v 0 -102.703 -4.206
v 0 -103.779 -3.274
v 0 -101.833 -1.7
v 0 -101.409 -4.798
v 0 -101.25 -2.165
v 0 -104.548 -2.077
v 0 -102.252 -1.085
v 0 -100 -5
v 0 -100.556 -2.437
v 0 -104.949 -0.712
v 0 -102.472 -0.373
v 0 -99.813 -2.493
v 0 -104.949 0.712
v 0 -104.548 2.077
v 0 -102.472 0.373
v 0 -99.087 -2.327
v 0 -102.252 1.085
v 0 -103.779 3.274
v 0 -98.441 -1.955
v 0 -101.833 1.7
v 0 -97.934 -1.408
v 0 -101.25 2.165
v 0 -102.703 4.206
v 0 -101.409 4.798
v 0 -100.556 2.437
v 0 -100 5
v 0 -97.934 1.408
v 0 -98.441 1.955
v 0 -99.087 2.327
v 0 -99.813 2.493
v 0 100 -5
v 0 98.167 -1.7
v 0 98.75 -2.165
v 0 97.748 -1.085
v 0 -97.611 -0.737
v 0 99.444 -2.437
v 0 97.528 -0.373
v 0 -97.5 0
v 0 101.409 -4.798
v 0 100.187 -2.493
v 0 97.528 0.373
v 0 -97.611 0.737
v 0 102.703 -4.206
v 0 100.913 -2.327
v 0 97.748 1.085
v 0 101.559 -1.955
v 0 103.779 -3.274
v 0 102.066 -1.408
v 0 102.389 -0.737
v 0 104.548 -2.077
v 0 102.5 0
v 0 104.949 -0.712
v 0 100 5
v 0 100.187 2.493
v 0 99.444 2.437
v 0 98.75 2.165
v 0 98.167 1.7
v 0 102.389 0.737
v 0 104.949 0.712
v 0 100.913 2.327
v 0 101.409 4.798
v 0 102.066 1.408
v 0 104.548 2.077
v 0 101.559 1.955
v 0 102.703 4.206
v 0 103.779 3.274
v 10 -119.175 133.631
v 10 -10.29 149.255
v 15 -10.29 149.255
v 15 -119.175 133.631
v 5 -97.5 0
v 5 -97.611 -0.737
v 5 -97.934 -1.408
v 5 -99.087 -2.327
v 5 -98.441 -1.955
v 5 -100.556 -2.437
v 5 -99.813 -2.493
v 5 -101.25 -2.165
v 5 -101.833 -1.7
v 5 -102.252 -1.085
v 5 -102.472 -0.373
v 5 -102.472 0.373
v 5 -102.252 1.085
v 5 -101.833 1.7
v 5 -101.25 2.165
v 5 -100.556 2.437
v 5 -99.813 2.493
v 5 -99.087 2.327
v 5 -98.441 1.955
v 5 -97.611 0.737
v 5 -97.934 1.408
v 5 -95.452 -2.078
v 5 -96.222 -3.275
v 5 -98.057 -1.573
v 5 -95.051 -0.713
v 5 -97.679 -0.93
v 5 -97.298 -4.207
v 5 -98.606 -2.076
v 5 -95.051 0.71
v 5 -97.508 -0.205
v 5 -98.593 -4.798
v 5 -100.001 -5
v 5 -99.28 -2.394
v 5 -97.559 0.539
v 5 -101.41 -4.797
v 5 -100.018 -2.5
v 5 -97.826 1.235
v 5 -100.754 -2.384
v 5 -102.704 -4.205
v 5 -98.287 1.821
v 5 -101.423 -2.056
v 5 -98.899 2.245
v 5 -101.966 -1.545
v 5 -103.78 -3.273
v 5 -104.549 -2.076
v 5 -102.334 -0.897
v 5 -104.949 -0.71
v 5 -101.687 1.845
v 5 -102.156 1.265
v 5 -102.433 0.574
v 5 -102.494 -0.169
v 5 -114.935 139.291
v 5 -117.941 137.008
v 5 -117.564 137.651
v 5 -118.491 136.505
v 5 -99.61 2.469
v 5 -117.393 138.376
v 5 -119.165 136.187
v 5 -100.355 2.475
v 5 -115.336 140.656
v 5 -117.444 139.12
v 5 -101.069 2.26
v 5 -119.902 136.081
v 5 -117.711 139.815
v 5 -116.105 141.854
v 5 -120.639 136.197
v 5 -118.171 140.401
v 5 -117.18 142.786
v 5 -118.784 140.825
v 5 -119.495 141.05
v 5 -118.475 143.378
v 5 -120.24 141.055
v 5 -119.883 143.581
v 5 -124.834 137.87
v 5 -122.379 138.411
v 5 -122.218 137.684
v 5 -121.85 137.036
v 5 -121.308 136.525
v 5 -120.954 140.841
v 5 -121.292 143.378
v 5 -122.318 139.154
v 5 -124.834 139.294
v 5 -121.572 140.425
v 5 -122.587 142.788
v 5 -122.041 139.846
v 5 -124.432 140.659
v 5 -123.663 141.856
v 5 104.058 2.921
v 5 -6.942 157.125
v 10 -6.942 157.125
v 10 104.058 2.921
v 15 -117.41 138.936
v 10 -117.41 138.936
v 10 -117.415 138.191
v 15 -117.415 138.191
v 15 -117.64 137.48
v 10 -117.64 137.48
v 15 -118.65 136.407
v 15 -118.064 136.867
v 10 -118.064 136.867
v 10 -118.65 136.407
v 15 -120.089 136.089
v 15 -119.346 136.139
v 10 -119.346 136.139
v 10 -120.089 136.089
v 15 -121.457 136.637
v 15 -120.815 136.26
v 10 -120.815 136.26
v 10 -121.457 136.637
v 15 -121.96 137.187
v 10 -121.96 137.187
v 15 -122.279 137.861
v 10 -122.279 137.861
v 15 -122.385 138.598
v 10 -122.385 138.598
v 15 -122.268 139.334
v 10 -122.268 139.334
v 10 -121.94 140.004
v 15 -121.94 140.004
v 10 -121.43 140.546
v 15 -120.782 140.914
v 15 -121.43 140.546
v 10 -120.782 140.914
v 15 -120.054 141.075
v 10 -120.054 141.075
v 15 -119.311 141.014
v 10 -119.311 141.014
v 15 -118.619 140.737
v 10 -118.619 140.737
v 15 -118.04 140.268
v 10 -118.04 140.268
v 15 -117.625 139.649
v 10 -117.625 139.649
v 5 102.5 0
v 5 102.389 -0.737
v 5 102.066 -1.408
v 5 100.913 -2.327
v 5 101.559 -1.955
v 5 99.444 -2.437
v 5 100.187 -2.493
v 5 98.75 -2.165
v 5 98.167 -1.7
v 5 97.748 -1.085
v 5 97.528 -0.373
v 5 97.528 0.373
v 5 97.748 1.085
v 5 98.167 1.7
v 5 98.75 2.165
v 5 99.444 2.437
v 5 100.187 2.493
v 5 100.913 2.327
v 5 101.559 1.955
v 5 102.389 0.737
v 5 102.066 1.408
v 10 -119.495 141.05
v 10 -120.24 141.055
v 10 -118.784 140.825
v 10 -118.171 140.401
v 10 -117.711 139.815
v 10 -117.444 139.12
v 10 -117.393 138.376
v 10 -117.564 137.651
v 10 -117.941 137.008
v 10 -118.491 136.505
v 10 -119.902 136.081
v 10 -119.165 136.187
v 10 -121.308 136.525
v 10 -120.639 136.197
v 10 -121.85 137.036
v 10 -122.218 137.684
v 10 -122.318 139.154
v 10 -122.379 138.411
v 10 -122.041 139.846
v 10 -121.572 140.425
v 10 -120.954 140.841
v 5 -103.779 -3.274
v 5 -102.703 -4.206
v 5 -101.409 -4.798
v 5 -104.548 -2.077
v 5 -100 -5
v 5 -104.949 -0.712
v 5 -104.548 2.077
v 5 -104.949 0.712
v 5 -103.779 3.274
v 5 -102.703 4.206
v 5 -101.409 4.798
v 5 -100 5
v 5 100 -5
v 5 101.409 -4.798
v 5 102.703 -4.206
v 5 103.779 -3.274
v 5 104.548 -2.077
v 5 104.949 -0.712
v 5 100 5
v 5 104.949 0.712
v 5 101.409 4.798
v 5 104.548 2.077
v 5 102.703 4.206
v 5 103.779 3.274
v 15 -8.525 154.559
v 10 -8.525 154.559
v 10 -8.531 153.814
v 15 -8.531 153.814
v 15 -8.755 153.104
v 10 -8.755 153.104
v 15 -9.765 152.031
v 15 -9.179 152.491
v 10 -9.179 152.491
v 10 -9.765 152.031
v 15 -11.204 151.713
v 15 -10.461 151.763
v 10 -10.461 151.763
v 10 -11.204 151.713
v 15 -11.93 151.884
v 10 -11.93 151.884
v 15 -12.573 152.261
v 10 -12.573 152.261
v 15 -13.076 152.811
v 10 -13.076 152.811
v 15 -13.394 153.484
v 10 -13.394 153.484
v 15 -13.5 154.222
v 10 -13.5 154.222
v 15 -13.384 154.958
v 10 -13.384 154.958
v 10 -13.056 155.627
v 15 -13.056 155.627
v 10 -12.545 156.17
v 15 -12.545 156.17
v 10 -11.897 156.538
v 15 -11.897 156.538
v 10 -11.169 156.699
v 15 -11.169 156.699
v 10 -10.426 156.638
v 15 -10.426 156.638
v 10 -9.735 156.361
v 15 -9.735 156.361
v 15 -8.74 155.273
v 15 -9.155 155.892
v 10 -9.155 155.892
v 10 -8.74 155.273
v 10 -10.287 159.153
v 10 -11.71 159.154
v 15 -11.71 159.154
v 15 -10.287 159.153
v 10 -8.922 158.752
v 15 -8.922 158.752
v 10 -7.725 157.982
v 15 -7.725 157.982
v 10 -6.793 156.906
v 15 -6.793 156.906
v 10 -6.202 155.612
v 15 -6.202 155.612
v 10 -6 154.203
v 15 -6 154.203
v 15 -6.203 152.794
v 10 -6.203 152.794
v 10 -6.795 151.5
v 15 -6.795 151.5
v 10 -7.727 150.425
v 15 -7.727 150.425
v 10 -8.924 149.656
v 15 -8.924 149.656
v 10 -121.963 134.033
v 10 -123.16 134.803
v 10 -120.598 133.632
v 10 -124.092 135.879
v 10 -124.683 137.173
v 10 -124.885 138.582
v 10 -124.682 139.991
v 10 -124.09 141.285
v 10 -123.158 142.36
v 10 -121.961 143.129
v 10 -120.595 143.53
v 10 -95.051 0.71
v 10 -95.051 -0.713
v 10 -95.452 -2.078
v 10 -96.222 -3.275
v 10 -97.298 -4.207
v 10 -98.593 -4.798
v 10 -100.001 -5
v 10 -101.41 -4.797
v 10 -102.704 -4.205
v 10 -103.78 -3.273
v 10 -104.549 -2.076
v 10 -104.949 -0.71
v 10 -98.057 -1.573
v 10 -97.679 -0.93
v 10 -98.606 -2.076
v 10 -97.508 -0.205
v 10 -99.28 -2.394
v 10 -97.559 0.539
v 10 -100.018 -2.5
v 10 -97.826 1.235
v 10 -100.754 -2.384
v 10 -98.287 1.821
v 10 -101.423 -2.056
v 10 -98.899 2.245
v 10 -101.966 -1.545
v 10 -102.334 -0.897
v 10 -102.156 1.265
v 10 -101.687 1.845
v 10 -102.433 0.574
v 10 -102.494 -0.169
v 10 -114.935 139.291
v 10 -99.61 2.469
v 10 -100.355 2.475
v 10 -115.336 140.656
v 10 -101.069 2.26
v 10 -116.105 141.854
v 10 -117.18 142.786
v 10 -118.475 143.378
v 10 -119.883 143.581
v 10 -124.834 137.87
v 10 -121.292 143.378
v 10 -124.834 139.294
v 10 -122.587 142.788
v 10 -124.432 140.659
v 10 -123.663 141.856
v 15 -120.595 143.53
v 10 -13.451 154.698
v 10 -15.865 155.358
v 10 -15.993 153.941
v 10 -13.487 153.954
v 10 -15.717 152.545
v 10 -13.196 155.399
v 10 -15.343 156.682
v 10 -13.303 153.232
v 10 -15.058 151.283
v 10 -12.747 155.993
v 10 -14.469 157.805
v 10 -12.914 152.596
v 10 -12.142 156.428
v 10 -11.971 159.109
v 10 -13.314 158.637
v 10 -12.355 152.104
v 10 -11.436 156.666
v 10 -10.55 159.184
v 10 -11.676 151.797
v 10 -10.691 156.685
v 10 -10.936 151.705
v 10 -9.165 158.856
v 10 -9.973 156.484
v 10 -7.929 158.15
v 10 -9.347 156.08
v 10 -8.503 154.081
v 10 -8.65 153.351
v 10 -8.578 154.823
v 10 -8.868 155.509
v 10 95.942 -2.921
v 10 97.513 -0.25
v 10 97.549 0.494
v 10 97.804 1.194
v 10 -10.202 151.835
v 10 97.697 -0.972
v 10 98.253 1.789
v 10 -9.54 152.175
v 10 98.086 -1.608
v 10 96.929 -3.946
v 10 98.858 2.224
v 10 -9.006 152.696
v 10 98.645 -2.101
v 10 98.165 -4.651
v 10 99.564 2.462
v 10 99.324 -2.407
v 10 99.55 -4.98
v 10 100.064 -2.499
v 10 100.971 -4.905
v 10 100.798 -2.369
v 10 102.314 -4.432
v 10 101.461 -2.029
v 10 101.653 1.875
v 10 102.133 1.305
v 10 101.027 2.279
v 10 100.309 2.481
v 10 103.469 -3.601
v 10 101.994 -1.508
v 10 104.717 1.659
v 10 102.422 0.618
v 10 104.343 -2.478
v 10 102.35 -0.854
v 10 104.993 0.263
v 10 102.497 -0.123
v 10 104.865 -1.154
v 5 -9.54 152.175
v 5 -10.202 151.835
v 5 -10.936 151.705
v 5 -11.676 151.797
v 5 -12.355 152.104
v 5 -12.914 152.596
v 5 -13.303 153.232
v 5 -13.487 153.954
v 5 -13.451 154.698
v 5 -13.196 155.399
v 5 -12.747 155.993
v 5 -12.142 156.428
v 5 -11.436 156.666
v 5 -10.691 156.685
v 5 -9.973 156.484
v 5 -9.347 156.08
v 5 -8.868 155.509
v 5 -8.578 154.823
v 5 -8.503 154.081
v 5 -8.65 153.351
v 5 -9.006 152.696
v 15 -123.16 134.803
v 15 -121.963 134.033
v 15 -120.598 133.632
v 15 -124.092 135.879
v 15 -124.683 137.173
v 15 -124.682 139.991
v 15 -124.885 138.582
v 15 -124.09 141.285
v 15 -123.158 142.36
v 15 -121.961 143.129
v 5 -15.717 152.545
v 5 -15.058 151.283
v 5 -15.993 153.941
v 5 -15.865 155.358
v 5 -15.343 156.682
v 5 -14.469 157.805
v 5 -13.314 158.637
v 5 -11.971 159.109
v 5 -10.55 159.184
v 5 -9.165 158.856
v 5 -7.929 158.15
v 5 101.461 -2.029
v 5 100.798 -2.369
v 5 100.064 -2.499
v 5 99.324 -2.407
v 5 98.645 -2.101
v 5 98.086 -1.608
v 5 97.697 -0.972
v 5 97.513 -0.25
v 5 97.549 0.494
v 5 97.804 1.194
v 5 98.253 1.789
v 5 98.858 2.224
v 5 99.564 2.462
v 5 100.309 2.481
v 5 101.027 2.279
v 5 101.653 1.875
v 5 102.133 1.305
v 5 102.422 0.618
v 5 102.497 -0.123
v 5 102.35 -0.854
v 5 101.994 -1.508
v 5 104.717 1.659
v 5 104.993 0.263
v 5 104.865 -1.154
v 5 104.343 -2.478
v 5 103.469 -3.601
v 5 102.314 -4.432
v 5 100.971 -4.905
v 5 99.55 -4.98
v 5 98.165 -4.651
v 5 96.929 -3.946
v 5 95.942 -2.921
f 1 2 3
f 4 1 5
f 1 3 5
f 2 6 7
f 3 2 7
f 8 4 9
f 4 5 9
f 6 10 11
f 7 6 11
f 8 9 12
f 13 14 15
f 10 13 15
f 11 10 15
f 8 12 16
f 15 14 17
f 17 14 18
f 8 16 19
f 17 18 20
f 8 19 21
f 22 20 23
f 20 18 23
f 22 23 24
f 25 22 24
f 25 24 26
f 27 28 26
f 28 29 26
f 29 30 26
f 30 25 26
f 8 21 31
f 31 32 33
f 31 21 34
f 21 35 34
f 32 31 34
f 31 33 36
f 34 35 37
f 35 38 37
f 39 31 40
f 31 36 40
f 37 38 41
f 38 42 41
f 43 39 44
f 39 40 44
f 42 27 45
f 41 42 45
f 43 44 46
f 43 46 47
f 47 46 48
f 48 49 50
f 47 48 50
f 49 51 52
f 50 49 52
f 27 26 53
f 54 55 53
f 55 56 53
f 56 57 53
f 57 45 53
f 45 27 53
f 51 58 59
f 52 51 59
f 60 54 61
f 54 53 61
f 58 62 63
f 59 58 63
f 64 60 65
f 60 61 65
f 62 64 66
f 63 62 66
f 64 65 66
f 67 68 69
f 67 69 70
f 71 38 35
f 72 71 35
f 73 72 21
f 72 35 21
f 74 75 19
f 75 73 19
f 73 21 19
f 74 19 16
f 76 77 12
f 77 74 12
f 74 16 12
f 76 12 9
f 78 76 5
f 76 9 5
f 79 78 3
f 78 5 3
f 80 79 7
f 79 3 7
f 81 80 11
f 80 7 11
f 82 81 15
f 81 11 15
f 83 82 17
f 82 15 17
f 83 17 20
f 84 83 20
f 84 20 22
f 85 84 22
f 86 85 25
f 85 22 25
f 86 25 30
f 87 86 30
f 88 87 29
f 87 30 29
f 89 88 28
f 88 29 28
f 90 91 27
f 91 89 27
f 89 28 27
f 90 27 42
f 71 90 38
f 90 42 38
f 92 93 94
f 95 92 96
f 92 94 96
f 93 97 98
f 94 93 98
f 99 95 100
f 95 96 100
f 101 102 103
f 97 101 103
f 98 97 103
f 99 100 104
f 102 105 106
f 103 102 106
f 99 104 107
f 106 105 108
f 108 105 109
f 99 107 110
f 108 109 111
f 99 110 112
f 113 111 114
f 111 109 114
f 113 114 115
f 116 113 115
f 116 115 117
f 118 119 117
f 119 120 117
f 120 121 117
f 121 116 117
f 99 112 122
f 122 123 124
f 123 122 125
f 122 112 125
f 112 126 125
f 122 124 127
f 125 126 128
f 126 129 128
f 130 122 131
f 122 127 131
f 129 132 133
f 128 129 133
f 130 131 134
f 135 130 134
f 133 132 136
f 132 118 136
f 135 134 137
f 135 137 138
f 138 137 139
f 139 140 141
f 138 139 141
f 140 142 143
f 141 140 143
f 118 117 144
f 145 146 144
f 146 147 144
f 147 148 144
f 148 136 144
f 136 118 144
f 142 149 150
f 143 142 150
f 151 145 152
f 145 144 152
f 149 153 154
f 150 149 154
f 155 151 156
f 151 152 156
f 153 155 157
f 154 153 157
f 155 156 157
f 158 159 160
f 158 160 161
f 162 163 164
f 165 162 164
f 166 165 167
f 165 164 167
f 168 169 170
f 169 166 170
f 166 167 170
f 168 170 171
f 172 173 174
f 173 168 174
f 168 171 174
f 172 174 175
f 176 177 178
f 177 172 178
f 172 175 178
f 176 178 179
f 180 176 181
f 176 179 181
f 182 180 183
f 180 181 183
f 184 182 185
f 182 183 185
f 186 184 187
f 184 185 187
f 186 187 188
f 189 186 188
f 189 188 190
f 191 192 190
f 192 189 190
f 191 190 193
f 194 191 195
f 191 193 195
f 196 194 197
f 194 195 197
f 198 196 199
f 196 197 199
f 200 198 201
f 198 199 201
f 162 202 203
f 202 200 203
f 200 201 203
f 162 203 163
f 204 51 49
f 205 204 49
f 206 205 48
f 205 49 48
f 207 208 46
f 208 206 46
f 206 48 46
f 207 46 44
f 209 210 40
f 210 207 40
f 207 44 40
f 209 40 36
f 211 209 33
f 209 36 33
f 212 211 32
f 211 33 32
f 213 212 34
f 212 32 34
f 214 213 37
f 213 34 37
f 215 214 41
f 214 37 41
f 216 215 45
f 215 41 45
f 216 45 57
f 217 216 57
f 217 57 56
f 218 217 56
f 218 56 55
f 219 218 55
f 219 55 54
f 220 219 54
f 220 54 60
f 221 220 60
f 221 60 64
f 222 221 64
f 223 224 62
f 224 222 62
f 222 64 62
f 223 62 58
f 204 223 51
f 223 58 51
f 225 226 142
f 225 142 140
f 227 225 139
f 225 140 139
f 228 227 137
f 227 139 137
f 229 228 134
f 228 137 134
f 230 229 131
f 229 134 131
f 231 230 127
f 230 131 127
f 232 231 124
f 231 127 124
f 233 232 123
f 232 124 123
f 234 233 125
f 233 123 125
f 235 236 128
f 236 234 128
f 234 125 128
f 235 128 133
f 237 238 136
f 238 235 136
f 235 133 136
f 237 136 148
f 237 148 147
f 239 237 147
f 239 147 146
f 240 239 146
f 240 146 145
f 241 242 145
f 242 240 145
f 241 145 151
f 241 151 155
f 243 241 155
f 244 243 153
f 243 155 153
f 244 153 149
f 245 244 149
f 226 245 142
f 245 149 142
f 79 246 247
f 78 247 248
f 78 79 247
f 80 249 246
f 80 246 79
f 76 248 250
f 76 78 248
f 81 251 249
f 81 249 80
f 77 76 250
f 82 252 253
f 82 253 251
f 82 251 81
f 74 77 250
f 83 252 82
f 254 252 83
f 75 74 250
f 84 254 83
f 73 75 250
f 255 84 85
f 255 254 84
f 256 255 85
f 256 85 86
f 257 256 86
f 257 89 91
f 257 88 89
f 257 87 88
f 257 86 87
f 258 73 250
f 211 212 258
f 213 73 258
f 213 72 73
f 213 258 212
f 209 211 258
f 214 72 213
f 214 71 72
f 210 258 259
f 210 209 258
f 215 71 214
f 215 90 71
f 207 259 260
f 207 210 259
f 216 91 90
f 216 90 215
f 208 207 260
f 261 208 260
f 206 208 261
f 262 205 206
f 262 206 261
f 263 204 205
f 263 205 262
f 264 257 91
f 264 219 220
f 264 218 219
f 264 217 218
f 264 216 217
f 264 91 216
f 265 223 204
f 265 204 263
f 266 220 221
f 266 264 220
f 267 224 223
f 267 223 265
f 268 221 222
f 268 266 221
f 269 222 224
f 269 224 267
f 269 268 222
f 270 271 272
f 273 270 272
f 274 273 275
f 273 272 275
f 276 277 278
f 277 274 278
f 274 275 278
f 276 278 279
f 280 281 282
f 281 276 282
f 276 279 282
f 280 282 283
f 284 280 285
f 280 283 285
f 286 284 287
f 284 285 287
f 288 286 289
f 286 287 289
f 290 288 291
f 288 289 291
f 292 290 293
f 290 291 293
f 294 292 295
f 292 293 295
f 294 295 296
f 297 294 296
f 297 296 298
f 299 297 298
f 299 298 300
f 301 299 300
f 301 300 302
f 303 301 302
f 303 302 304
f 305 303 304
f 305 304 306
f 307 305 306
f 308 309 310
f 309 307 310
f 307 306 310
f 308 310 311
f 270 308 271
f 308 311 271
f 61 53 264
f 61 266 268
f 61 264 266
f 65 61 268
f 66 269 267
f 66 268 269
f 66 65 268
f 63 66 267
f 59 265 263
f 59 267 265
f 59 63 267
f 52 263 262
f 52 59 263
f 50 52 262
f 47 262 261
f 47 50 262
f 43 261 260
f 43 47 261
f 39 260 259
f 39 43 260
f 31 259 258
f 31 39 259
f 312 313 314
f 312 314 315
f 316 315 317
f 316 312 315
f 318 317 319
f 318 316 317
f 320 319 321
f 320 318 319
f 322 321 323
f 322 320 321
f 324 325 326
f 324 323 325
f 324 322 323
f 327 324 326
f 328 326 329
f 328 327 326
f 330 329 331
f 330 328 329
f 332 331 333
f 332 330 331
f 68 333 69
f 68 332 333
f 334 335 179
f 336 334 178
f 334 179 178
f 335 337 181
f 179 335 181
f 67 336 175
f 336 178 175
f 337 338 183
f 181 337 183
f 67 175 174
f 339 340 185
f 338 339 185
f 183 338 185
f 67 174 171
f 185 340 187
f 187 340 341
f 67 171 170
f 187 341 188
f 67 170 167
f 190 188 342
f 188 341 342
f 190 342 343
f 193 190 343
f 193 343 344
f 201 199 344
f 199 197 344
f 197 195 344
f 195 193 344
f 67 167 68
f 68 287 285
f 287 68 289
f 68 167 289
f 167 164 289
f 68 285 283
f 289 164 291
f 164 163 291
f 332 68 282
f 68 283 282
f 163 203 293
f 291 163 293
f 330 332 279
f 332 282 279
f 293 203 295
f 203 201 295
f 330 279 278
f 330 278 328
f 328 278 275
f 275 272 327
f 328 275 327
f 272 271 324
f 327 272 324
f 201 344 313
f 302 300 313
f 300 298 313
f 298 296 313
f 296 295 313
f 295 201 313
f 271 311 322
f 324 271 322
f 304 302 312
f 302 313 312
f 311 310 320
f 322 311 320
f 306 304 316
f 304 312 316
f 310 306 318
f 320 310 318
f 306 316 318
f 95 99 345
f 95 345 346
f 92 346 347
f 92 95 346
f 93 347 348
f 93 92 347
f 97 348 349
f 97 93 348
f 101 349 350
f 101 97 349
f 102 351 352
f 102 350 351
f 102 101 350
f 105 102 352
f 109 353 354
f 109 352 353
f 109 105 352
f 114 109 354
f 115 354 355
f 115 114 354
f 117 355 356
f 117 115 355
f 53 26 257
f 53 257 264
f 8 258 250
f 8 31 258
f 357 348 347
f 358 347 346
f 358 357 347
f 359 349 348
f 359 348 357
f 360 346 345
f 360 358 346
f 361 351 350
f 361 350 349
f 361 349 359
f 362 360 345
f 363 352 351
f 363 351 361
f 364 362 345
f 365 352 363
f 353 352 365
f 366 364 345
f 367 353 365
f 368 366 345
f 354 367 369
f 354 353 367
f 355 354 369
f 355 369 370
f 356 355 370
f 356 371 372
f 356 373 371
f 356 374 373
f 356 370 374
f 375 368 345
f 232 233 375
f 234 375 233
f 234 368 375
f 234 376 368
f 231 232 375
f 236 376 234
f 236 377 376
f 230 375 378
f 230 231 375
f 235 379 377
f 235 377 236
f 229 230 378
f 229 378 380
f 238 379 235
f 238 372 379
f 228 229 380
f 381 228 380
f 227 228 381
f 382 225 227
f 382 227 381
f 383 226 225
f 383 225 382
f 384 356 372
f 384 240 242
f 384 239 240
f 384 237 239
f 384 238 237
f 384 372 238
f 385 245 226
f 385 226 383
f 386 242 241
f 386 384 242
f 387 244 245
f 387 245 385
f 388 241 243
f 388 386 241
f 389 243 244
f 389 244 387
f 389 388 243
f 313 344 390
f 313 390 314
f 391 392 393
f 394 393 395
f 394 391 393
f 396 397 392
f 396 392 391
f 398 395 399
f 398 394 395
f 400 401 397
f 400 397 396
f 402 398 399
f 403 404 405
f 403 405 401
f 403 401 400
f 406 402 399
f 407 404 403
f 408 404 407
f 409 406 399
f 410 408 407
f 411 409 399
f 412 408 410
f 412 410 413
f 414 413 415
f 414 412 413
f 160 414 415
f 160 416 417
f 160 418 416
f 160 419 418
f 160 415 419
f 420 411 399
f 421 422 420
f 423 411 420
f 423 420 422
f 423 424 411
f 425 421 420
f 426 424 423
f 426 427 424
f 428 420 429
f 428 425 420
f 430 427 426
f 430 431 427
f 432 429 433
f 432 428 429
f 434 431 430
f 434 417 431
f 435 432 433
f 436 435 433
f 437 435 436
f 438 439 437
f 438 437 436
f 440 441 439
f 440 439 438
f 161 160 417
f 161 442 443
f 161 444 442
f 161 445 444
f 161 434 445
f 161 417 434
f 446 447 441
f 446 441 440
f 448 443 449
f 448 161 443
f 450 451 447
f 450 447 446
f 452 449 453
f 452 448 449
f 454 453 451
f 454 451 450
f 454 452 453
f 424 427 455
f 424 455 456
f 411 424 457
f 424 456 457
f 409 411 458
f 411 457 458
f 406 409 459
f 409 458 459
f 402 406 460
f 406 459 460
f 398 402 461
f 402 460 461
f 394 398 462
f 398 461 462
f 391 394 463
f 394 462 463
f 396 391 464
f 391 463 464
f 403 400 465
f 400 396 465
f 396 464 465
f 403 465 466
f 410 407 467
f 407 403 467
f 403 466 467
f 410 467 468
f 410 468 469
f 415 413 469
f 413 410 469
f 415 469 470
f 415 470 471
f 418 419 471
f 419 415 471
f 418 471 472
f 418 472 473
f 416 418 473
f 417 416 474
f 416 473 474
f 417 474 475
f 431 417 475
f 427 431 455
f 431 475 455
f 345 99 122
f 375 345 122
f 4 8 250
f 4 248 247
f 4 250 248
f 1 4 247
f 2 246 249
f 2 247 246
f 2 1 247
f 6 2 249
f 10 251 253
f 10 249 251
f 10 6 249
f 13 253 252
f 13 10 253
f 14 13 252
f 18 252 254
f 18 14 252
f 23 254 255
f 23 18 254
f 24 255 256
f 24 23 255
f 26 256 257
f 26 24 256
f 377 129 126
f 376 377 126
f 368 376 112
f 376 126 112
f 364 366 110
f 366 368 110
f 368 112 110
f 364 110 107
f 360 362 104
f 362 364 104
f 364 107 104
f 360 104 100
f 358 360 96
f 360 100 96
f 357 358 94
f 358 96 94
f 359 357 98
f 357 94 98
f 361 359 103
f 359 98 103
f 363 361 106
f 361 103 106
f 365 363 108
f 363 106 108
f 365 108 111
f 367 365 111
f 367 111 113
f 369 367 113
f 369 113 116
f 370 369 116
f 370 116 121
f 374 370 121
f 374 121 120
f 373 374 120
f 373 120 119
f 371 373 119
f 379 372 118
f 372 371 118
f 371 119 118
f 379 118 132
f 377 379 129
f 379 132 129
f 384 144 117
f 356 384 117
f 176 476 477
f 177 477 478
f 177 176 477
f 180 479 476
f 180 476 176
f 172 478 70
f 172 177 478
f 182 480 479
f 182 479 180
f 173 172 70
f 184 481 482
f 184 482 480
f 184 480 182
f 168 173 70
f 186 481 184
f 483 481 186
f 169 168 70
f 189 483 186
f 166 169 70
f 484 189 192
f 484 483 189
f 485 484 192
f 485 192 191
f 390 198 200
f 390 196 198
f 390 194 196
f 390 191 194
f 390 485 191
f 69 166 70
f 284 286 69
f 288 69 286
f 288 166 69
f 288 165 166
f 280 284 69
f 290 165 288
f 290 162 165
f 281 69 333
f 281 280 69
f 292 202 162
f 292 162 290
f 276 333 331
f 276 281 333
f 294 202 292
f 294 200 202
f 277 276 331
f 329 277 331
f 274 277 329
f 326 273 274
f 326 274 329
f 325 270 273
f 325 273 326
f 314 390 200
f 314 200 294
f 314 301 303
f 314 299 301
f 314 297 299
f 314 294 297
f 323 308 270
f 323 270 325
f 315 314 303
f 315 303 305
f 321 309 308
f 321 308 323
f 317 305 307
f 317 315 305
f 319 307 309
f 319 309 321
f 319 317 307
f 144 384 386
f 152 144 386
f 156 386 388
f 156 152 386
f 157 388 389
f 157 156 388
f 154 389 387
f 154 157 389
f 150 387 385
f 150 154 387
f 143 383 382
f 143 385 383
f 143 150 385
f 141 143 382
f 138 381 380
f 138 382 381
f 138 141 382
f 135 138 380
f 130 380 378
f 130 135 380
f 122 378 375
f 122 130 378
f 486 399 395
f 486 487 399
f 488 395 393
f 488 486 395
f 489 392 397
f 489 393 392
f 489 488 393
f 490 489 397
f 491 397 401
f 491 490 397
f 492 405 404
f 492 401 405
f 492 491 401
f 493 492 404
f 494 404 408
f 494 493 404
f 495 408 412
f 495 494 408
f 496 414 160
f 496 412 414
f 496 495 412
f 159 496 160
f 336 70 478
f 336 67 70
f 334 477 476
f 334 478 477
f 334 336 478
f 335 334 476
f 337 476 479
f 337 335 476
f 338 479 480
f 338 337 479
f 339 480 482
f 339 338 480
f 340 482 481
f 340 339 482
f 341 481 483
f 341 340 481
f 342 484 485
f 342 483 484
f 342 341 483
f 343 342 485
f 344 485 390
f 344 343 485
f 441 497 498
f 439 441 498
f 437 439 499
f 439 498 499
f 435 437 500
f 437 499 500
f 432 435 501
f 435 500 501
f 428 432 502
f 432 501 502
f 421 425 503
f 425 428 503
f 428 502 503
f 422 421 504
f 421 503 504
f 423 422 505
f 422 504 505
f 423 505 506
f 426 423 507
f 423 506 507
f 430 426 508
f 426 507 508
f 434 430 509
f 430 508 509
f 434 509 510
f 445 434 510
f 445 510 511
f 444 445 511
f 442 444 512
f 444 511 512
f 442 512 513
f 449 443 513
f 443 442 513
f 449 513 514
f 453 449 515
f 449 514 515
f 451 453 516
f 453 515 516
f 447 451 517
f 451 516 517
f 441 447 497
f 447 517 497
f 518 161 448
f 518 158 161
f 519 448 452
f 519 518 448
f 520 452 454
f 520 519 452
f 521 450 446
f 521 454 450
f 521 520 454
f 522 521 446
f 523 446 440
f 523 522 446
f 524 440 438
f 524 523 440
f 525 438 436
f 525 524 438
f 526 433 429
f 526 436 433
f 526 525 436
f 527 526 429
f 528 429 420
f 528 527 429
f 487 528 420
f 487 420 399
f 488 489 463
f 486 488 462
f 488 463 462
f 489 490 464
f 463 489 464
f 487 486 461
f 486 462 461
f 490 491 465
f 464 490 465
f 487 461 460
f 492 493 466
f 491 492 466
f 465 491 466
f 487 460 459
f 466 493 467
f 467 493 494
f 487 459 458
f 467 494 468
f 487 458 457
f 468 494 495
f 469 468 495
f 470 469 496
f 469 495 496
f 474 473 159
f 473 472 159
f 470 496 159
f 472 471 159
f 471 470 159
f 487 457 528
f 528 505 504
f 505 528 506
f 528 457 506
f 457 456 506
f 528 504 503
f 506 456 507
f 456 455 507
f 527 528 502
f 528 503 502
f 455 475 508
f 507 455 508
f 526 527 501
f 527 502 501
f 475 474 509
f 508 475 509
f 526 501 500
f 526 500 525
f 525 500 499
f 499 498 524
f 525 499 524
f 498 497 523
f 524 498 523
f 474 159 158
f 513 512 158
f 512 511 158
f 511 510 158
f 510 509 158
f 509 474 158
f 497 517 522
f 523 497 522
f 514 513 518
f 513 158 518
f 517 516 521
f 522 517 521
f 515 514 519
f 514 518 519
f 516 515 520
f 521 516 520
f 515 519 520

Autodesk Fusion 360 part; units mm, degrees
sketch "Sketch1" plane through (0, 0, 0) normal (1, 0, 0) x (0, 1, 0)
  line L0 (100, -5) -> (-100, -5)
  line L1 (-100, 5) -> (100, 5)
  line L2 (100, -5) -> (-100, 5) construction
  line L3 (-100, -5) -> (100, 5) construction
  arc A0 (-99.5012, 4.9751) -> (-99.5012, -4.9751) centre (-100, 0) ccw
  arc A1 (99.5012, -4.9751) -> (99.5012, 4.9751) centre (100, 0) ccw
  circle A2 centre (-100, 0) radius 2.5
  circle A3 centre (100, 0) radius 2.5
  dimension "d1" = 5
  dimension "d2" = 5
extrude "Extrude1" add sketch "Sketch1" along normal blind 5 makes body 1
sketch "Sketch2" plane through (0, 0, 0) normal (1, 0, 0) x (0, 1, 0)
  line L0 (70, 5) -> (-70, 5)
  line L1 (-70, -5) -> (70, -5)
  line L2 (70, 5) -> (-70, -5) construction
  line L3 (-70, 5) -> (70, -5) construction
  arc A0 (-69.2893, 4.9492) -> (-69.2893, -4.9492) centre (-70, 0) ccw
  arc A1 (69.2893, -4.9492) -> (69.2893, 4.9492) centre (70, 0) ccw
  circle A2 centre (-70, 0) radius 2.5
  circle A3 centre (70, 0) radius 2.5
  dimension "d5" = 140
  dimension "d6" = 10
  dimension "d7" = 5
  dimension "d8" = 5
extrude "Extrude2" add sketch "Sketch2" along normal blind 5 separate body makes body 2
sketch "Sketch3" plane through (0, 0, 0) normal (1, 0, 0) x (0, 1, 0)
  line L0 (55, -5) -> (-55, -5)
  line L1 (-55, 5) -> (55, 5)
  line L2 (55, -5) -> (-55, 5) construction
  line L3 (-55, -5) -> (55, 5) construction
  arc A0 (-54.0984, 4.918) -> (-54.0984, -4.918) centre (-55, 0) ccw
  arc A1 (54.0984, -4.918) -> (54.0984, 4.918) centre (55, 0) ccw
  circle A2 centre (55, 0) radius 2.5
  circle A3 centre (-55, 0) radius 2.5
  dimension "d11" = 110
  dimension "d12" = 5
  dimension "d13" = 5
extrude "Extrude3" add sketch "Sketch3" along normal blind 5 separate body makes body 3
sketch "Sketch4" plane through (0, 0, 0) normal (1, 0, 0) x (0, 1, 0)
  line L0 (95, -5) -> (-95, -5)
  line L1 (-95, 5) -> (95, 5)
  line L2 (95, -5) -> (-95, 5) construction
  line L3 (-95, -5) -> (95, 5) construction
  arc A0 (-94.4751, 4.9724) -> (-94.4751, -4.9724) centre (-95, 0) ccw
  arc A1 (94.4751, -4.9724) -> (94.4751, 4.9724) centre (95, 0) ccw
  circle A2 centre (-95, 0) radius 2.5
  circle A3 centre (95, 0) radius 2.5
  dimension "d16" = 190
  dimension "d17" = 5
  dimension "d18" = 5
extrude "Extrude4" add sketch "Sketch4" along normal blind 5 separate body makes body 4
copy_body "Body->Comp1" bodies 4 removing the originals makes body 5 in component "L4(190mm)"
copy_body "Body->Comp2" bodies 3 removing the originals makes body 6 in component "L3(110mm)"
copy_body "Body->Comp3" bodies 2 removing the originals makes body 7 in component "L2(140mm)"
copy_body "Body->Comp4" bodies 1 removing the originals makes body 8 in component "L1(200mm)"
component "L4(190mm)" placed x (1, 0, 0) y (0, 0.584211, -0.811602) z (0, 0.811602, 0.584211) at (5, 44.5, 77.1022)
component "L3(110mm)" placed x (1, 0, 0) y (0, 0.989862, 0.142034) z (0, -0.142034, 0.989862) at (10, -65.4424, 146.3925)
component "L2(140mm)" placed x (1, 0, 0) y (0, -0.142034, 0.989862) z (0, -0.989862, -0.142034) at (5, -109.9424, 69.2903)
component "L1(200mm)" placed x (1, 0, 0) y (0, 1, 0) z (0, 0, 1) at (0, 0, 0)
